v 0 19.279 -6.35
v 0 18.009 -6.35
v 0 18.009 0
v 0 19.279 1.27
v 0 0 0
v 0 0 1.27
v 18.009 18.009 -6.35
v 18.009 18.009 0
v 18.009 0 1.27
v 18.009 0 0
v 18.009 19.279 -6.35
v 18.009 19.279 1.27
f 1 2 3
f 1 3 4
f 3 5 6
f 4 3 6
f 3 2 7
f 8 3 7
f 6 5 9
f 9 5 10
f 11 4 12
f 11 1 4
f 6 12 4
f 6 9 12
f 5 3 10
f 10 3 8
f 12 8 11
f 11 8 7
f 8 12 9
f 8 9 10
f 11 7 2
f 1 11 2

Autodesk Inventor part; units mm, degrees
ref_plane "YZ Plane" through (0, 0, 0) normal (1, 0, 0) x (0, 1, 0)
ref_plane "XZ Plane" through (0, 0, 0) normal (0, 1, 0) x (-1, 0, 0)
ref_plane "XY Plane" through (0, 0, 0) normal (0, 0, 1) x (1, 0, 0)
sketch "Sketch1" plane through (0, 0, 0) normal (0, 0, 1) x (1, 0, 0)
  line L0 (0, 0) -> (18.0086, 0)
  line L1 (18.0086, 0) -> (18.0086, 18.0086)
  line L2 (18.0086, 18.0086) -> (0, 18.0086)
  line L3 (0, 18.0086) -> (0, 0)
  dimension "d0" = 18.0086
  dimension "d1" = 18.0086
extrude "Extrusion1" add sketch "Sketch1" along normal blind 1.27
sketch "Sketch2" plane through (0, 18.0086, 0) normal (0, 1, 0) x (1, 0, 0)
  line L0 (0, 0) -> (18.0086, 0)
  line L1 (18.0086, 0) -> (18.0086, 6.35)
  line L2 (18.0086, 6.35) -> (0, 6.35)
  line L3 (0, 6.35) -> (0, 0)
  dimension "d4" = 6.35
extrude "Extrusion2" add sketch "Sketch2" along normal blind 1.27
sketch "Sketch3" plane through (0, 18.0086, 1.27) normal (0, 1, 0) x (1, 0, 0)
  line L0 (18.0086, 0) -> (0, 0) projected
  line L1 (0, 0) -> (18.0086, 0)
  line L2 (18.0086, 0) -> (18.0086, 1.27)
  line L3 (18.0086, 1.27) -> (0, 1.27)
  line L4 (0, 1.27) -> (0, 0)
  point P0 (0, 1.27)
extrude "Extrusion3" add sketch "Sketch3" along normal blind 1.27
properties part number "CapLiftHolder"
